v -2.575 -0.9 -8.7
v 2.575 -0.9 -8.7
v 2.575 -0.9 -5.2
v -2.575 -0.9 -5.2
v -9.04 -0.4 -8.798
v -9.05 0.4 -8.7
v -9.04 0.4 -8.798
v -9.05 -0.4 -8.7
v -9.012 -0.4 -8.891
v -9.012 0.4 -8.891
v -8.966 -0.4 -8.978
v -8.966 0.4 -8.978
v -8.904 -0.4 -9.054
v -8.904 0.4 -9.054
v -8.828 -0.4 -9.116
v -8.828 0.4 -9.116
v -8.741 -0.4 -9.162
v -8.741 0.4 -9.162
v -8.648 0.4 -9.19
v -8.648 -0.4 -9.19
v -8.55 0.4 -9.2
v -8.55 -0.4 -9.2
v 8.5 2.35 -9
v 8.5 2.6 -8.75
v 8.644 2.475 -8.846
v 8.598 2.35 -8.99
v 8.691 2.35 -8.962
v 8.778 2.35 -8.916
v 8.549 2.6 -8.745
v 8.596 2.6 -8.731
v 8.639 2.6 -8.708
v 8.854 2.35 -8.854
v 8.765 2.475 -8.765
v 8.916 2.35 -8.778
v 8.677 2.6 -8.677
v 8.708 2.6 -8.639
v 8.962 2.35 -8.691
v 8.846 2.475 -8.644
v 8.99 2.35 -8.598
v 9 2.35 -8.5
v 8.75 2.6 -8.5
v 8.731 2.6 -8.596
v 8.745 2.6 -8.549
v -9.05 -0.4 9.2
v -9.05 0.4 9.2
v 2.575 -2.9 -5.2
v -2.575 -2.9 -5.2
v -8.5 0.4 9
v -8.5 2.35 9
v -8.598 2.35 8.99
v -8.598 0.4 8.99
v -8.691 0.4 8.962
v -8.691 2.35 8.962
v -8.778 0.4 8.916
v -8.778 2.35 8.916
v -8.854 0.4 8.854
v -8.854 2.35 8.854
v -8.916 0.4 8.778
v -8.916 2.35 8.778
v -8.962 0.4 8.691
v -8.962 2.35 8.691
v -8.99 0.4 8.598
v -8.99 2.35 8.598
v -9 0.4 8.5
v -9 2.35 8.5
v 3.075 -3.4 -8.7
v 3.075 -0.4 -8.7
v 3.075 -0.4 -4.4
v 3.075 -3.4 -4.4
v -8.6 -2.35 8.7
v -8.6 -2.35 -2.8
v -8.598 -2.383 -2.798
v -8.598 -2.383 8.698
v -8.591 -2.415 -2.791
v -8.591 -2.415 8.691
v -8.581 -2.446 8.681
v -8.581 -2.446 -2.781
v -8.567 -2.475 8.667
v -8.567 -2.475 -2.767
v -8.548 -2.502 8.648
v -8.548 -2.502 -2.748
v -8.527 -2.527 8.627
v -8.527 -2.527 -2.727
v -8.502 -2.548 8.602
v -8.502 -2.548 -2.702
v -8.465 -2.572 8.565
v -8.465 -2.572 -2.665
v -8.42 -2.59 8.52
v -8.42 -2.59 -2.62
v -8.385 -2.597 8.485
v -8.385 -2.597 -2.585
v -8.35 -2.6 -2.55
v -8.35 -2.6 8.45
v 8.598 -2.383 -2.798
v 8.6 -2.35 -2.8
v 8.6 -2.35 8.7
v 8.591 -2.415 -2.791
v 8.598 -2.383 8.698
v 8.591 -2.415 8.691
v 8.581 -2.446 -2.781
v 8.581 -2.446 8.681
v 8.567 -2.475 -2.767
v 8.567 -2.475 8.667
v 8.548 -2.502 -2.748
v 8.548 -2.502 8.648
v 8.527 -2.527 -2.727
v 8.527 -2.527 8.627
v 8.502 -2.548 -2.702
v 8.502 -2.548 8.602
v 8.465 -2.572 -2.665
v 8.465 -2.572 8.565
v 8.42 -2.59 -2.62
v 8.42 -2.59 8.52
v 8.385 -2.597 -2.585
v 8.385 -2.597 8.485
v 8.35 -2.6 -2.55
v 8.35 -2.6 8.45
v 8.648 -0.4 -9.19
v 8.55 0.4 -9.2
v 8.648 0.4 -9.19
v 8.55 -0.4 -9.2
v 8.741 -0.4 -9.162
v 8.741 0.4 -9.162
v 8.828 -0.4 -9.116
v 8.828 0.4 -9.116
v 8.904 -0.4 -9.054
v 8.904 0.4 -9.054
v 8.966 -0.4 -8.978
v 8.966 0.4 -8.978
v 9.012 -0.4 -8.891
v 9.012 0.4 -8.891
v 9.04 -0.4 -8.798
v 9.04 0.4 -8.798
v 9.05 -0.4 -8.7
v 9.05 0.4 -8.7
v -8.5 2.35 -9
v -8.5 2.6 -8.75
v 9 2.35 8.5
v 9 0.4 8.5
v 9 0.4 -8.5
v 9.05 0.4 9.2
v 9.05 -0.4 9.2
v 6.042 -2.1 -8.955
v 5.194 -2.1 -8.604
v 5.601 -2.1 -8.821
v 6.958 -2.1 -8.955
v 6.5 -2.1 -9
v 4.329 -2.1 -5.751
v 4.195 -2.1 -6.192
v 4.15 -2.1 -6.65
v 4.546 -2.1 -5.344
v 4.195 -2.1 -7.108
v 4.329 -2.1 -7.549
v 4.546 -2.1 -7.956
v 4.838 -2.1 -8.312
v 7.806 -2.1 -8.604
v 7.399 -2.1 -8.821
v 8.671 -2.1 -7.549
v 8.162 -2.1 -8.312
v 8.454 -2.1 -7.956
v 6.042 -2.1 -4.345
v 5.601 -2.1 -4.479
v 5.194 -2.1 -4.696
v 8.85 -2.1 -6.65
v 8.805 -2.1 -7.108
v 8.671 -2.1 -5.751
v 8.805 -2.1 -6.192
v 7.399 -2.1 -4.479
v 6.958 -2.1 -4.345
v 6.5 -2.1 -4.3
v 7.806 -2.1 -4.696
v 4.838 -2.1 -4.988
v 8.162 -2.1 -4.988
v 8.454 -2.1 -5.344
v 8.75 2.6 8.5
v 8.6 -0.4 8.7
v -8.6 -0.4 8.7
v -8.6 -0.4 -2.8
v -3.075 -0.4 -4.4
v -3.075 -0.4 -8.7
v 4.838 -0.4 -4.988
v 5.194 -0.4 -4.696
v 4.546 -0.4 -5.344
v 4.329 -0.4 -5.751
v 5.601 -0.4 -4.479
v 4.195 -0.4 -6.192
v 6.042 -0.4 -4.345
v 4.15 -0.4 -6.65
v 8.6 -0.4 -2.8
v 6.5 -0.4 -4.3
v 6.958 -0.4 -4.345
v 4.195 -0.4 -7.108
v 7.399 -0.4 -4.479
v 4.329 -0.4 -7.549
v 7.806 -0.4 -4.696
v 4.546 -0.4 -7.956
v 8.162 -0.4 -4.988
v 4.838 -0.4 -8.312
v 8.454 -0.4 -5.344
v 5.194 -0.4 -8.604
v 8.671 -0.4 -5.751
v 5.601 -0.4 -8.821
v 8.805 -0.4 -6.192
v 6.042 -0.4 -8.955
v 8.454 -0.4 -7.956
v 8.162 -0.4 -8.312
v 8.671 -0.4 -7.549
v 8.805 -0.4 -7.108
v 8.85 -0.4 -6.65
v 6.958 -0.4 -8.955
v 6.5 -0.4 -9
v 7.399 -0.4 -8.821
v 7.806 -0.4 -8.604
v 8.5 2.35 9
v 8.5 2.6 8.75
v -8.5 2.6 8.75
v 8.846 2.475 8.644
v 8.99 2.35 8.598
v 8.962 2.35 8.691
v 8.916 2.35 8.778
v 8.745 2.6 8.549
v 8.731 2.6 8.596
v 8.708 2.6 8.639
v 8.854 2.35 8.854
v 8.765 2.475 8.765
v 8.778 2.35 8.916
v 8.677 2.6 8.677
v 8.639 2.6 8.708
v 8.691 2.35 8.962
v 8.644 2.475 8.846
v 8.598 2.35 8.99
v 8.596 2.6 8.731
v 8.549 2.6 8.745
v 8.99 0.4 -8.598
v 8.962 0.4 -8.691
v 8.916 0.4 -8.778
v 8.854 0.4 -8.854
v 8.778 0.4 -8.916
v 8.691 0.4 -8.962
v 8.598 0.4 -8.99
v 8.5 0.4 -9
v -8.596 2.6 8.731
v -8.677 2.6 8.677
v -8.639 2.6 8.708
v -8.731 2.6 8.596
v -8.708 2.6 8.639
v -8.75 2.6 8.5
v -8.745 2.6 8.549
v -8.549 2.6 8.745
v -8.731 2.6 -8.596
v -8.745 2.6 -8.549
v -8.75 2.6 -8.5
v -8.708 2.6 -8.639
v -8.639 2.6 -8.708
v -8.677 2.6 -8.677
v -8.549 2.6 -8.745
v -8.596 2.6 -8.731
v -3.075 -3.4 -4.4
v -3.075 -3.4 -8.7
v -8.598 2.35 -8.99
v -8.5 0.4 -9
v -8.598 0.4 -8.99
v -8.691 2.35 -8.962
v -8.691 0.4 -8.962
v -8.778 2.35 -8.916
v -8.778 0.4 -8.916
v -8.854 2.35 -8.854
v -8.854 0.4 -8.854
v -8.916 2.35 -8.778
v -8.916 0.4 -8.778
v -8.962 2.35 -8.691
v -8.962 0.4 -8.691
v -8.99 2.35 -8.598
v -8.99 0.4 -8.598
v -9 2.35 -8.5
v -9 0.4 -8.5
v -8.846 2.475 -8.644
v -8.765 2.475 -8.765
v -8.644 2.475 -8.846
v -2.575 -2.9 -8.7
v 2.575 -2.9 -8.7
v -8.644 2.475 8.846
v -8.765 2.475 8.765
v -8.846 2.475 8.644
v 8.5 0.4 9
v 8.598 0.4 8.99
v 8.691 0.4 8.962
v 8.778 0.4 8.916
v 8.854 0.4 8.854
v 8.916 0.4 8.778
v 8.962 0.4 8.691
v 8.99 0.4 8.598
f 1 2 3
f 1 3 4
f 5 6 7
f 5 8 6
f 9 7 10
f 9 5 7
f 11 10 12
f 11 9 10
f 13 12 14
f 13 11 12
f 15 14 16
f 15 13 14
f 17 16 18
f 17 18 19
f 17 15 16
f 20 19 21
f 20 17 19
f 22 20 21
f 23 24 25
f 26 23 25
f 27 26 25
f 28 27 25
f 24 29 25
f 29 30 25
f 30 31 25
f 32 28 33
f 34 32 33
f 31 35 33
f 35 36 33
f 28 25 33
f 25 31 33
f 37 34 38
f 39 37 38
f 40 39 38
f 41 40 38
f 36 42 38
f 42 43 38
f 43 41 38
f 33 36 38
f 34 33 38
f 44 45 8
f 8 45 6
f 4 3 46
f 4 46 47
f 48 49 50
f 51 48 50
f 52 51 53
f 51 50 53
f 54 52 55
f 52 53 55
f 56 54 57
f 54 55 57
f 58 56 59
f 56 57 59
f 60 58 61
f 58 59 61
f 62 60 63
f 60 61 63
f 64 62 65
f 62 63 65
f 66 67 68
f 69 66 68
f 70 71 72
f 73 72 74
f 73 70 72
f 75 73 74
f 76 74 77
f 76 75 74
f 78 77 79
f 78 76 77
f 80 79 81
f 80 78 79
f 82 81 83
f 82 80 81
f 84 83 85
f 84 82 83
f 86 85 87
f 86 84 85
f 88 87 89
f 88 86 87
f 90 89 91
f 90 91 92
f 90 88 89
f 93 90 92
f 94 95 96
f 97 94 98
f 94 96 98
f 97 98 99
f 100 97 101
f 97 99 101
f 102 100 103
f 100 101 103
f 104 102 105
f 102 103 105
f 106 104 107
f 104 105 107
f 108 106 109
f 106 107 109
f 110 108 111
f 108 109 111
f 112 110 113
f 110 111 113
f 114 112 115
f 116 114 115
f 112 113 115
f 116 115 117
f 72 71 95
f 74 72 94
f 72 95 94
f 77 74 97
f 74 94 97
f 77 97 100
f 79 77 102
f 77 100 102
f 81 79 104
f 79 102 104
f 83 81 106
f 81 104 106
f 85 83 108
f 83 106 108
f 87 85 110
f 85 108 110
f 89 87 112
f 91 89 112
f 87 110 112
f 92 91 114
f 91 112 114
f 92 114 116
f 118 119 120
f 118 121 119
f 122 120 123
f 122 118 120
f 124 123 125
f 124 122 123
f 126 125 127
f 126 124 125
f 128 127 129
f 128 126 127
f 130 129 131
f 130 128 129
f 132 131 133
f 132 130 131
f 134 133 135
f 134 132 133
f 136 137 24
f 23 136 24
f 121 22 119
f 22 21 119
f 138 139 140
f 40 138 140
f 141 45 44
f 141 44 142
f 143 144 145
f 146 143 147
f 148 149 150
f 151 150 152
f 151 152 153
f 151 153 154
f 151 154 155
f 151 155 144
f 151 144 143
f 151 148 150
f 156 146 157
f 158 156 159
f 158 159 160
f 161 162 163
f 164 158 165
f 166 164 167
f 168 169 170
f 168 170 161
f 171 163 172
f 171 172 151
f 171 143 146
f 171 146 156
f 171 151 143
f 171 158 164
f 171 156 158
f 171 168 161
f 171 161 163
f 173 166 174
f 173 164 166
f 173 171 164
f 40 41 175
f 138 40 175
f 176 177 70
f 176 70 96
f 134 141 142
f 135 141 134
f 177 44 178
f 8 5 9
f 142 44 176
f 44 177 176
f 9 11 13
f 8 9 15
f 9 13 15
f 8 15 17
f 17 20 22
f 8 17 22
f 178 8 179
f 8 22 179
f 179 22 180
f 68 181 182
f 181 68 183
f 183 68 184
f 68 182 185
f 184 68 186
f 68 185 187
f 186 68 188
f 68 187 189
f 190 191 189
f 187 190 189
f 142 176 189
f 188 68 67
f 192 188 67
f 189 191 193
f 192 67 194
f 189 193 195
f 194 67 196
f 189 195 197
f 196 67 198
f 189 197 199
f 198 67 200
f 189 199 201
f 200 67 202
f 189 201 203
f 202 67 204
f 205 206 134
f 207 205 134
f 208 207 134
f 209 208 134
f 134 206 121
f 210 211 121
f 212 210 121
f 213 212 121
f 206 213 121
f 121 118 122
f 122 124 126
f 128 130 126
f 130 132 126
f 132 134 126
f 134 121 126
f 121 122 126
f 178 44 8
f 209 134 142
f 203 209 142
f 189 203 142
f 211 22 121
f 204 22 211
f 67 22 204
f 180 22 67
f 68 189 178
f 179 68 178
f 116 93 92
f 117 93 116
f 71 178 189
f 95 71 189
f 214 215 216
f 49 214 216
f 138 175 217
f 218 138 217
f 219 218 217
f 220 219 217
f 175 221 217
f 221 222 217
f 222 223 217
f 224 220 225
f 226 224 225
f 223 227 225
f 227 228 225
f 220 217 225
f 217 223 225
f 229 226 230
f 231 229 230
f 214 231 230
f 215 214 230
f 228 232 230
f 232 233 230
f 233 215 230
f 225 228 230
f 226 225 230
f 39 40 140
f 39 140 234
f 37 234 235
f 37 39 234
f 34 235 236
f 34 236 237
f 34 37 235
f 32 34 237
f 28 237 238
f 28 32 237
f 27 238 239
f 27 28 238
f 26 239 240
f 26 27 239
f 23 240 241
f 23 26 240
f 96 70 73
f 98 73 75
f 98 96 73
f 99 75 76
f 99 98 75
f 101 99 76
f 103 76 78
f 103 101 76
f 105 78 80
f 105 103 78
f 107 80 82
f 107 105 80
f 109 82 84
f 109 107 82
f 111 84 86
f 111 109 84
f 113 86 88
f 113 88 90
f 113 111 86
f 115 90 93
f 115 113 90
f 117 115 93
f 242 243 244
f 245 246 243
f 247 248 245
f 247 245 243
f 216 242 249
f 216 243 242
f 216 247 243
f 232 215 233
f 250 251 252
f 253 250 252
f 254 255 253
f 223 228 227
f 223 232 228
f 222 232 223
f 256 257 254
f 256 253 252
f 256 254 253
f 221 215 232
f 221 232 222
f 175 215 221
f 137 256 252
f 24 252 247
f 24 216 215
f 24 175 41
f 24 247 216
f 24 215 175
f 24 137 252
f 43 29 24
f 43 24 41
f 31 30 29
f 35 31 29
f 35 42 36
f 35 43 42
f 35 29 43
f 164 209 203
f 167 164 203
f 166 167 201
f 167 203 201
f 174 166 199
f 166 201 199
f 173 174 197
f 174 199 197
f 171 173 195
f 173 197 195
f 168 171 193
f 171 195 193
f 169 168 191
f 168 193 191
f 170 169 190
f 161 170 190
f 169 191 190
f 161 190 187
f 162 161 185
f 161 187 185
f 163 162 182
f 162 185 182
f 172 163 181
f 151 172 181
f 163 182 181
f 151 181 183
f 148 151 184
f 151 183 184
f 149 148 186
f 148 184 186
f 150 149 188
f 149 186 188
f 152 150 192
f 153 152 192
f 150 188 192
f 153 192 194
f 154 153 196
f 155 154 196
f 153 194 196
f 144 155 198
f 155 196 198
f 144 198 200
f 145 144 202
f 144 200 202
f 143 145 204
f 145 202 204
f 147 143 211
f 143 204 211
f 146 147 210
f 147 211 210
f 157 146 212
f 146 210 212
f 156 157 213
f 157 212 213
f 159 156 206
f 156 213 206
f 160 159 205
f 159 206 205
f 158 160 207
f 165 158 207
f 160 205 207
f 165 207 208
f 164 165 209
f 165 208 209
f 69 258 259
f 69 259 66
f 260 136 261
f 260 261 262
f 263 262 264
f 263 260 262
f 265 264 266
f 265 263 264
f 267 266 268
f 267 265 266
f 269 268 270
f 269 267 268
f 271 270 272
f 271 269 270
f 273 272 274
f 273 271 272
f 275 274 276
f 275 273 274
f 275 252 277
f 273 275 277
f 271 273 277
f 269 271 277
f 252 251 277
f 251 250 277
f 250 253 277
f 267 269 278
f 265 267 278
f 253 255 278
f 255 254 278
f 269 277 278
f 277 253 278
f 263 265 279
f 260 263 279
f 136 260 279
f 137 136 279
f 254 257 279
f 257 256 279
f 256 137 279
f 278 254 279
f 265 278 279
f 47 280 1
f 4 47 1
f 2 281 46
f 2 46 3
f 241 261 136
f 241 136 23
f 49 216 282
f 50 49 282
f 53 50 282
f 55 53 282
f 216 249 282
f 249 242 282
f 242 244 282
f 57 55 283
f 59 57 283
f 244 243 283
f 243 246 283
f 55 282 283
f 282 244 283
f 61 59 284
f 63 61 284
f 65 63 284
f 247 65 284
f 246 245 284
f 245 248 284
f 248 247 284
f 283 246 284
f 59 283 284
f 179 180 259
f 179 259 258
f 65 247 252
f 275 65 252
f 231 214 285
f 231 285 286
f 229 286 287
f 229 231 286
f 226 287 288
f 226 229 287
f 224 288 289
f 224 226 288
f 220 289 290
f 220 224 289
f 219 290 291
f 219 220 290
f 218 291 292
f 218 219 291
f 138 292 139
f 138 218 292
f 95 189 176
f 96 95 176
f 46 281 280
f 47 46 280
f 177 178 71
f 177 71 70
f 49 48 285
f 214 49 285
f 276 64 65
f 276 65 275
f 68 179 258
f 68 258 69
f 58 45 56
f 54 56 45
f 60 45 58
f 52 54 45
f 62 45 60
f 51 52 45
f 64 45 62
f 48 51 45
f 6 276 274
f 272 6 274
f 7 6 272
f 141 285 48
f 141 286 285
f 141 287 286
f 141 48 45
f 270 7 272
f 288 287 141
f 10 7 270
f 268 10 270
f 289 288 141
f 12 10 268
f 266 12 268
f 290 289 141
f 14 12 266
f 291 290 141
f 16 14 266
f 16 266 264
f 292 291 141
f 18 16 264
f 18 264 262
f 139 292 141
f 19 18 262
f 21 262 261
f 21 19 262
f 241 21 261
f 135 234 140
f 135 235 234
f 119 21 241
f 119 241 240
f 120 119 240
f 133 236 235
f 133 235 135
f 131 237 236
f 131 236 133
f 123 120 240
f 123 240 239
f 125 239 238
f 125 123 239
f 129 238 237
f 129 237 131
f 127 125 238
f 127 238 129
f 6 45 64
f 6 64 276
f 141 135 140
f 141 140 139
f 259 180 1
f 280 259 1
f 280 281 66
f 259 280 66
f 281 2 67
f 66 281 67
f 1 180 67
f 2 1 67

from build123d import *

# Parameters (mm, degrees)
SKETCH1_W           = 18.1
SKETCH1_H           = 18.4
BOSS_EXTRUDE1_DEPTH = 0.4
SKETCH2_W           = 18
SKETCH2_H           = 18
BOSS_EXTRUDE2_DEPTH = 2.2
SKETCH3_W           = 6.15
SKETCH3_H           = 4.3
BOSS_EXTRUDE3_DEPTH = 3
SKETCH4_W           = 5.15
SKETCH4_H           = 2
CUT_EXTRUDE1_DEPTH  = 3.5
SKETCH5_W           = 17.2
SKETCH5_H           = 11.5
BOSS_EXTRUDE4_DEPTH = 2.2
FILLET1_R           = 0.25
SKETCH6_R           = 2.35
BOSS_EXTRUDE5_DEPTH = 1.7
FILLET2_R           = 0.5
CHAMFER1_SIZE       = 0.25
FILLET3_R           = 0.5


with BuildPart() as part:
    # Sketch1 → Boss-Extrude1 (new body, symmetric)
    with BuildSketch(Plane(origin=(0, 0, 0), x_dir=(1, 0, 0), z_dir=(0, 1, 0))):
        Rectangle(SKETCH1_W, SKETCH1_H)
    extrude(amount=BOSS_EXTRUDE1_DEPTH, both=True)

    # Sketch2 → Boss-Extrude2 (add)
    with BuildSketch(Plane(origin=(0, 0.4, 0), x_dir=(1, 0, 0), z_dir=(0, 1, 0))):
        Rectangle(SKETCH2_W, SKETCH2_H)
    extrude(amount=BOSS_EXTRUDE2_DEPTH)

    # Sketch3 → Boss-Extrude3 (add)
    with BuildSketch(Plane.XZ.offset(0.4)):
        with Locations((0, -6.55)):
            Rectangle(SKETCH3_W, SKETCH3_H)
    extrude(amount=BOSS_EXTRUDE3_DEPTH)

    # Sketch4 → Cut-Extrude1 (cut)
    with BuildSketch(Plane(origin=(0, 0, -8.7), x_dir=(-1, 0, 0), z_dir=(0, 0, -1))):
        with Locations((0, -1.9)):
            Rectangle(SKETCH4_W, SKETCH4_H)
    extrude(amount=-CUT_EXTRUDE1_DEPTH, mode=Mode.SUBTRACT)

    # Sketch5 → Boss-Extrude4 (add)
    with BuildSketch(Plane.XZ.offset(0.4)):
        with Locations((0, 2.95)):
            Rectangle(SKETCH5_W, SKETCH5_H)
    extrude(amount=BOSS_EXTRUDE4_DEPTH)

    # Fillet1
    fillet1_edges = [part.edges().sort_by_distance(p)[0] for p in [
        (8.6, -2.6, 2.95),
        (0, -2.6, 8.7),
        (-8.6, -2.6, 2.95),
        (0, -2.6, -2.8),
    ]]
    fillet(fillet1_edges, radius=FILLET1_R)

    # Sketch6 → Boss-Extrude5 (add)
    with BuildSketch(Plane.XZ.offset(0.4)):
        with Locations((6.5, -6.65)):
            Circle(SKETCH6_R)
    extrude(amount=BOSS_EXTRUDE5_DEPTH)

    # Fillet2
    fillet2_edges = [part.edges().sort_by_distance(p)[0] for p in [
        (-9, 1.5, -9),
        (-9, 1.5, 9),
        (9, 1.5, 9),
        (9, 1.5, -9),
    ]]
    fillet(fillet2_edges, radius=FILLET2_R)

    # Chamfer1
    chamfer1_edges = [part.edges().sort_by_distance(p)[0] for p in [
        (-9, 2.6, 0),
        (0, 2.6, -9),
        (0, 2.6, 9),
        (9, 2.6, 0),
        (8.853553391, 2.6, -8.853553391),
        (8.853553391, 2.6, 8.853553391),
        (-8.853553391, 2.6, 8.853553391),
        (-8.853553391, 2.6, -8.853553391),
    ]]
    chamfer(chamfer1_edges, length=CHAMFER1_SIZE)

    # Fillet3
    fillet3_edges = [part.edges().sort_by_distance(p)[0] for p in [
        (-9.05, 0, -9.2),
        (9.05, 0, -9.2),
    ]]
    fillet(fillet3_edges, radius=FILLET3_R)


solid = part.part
